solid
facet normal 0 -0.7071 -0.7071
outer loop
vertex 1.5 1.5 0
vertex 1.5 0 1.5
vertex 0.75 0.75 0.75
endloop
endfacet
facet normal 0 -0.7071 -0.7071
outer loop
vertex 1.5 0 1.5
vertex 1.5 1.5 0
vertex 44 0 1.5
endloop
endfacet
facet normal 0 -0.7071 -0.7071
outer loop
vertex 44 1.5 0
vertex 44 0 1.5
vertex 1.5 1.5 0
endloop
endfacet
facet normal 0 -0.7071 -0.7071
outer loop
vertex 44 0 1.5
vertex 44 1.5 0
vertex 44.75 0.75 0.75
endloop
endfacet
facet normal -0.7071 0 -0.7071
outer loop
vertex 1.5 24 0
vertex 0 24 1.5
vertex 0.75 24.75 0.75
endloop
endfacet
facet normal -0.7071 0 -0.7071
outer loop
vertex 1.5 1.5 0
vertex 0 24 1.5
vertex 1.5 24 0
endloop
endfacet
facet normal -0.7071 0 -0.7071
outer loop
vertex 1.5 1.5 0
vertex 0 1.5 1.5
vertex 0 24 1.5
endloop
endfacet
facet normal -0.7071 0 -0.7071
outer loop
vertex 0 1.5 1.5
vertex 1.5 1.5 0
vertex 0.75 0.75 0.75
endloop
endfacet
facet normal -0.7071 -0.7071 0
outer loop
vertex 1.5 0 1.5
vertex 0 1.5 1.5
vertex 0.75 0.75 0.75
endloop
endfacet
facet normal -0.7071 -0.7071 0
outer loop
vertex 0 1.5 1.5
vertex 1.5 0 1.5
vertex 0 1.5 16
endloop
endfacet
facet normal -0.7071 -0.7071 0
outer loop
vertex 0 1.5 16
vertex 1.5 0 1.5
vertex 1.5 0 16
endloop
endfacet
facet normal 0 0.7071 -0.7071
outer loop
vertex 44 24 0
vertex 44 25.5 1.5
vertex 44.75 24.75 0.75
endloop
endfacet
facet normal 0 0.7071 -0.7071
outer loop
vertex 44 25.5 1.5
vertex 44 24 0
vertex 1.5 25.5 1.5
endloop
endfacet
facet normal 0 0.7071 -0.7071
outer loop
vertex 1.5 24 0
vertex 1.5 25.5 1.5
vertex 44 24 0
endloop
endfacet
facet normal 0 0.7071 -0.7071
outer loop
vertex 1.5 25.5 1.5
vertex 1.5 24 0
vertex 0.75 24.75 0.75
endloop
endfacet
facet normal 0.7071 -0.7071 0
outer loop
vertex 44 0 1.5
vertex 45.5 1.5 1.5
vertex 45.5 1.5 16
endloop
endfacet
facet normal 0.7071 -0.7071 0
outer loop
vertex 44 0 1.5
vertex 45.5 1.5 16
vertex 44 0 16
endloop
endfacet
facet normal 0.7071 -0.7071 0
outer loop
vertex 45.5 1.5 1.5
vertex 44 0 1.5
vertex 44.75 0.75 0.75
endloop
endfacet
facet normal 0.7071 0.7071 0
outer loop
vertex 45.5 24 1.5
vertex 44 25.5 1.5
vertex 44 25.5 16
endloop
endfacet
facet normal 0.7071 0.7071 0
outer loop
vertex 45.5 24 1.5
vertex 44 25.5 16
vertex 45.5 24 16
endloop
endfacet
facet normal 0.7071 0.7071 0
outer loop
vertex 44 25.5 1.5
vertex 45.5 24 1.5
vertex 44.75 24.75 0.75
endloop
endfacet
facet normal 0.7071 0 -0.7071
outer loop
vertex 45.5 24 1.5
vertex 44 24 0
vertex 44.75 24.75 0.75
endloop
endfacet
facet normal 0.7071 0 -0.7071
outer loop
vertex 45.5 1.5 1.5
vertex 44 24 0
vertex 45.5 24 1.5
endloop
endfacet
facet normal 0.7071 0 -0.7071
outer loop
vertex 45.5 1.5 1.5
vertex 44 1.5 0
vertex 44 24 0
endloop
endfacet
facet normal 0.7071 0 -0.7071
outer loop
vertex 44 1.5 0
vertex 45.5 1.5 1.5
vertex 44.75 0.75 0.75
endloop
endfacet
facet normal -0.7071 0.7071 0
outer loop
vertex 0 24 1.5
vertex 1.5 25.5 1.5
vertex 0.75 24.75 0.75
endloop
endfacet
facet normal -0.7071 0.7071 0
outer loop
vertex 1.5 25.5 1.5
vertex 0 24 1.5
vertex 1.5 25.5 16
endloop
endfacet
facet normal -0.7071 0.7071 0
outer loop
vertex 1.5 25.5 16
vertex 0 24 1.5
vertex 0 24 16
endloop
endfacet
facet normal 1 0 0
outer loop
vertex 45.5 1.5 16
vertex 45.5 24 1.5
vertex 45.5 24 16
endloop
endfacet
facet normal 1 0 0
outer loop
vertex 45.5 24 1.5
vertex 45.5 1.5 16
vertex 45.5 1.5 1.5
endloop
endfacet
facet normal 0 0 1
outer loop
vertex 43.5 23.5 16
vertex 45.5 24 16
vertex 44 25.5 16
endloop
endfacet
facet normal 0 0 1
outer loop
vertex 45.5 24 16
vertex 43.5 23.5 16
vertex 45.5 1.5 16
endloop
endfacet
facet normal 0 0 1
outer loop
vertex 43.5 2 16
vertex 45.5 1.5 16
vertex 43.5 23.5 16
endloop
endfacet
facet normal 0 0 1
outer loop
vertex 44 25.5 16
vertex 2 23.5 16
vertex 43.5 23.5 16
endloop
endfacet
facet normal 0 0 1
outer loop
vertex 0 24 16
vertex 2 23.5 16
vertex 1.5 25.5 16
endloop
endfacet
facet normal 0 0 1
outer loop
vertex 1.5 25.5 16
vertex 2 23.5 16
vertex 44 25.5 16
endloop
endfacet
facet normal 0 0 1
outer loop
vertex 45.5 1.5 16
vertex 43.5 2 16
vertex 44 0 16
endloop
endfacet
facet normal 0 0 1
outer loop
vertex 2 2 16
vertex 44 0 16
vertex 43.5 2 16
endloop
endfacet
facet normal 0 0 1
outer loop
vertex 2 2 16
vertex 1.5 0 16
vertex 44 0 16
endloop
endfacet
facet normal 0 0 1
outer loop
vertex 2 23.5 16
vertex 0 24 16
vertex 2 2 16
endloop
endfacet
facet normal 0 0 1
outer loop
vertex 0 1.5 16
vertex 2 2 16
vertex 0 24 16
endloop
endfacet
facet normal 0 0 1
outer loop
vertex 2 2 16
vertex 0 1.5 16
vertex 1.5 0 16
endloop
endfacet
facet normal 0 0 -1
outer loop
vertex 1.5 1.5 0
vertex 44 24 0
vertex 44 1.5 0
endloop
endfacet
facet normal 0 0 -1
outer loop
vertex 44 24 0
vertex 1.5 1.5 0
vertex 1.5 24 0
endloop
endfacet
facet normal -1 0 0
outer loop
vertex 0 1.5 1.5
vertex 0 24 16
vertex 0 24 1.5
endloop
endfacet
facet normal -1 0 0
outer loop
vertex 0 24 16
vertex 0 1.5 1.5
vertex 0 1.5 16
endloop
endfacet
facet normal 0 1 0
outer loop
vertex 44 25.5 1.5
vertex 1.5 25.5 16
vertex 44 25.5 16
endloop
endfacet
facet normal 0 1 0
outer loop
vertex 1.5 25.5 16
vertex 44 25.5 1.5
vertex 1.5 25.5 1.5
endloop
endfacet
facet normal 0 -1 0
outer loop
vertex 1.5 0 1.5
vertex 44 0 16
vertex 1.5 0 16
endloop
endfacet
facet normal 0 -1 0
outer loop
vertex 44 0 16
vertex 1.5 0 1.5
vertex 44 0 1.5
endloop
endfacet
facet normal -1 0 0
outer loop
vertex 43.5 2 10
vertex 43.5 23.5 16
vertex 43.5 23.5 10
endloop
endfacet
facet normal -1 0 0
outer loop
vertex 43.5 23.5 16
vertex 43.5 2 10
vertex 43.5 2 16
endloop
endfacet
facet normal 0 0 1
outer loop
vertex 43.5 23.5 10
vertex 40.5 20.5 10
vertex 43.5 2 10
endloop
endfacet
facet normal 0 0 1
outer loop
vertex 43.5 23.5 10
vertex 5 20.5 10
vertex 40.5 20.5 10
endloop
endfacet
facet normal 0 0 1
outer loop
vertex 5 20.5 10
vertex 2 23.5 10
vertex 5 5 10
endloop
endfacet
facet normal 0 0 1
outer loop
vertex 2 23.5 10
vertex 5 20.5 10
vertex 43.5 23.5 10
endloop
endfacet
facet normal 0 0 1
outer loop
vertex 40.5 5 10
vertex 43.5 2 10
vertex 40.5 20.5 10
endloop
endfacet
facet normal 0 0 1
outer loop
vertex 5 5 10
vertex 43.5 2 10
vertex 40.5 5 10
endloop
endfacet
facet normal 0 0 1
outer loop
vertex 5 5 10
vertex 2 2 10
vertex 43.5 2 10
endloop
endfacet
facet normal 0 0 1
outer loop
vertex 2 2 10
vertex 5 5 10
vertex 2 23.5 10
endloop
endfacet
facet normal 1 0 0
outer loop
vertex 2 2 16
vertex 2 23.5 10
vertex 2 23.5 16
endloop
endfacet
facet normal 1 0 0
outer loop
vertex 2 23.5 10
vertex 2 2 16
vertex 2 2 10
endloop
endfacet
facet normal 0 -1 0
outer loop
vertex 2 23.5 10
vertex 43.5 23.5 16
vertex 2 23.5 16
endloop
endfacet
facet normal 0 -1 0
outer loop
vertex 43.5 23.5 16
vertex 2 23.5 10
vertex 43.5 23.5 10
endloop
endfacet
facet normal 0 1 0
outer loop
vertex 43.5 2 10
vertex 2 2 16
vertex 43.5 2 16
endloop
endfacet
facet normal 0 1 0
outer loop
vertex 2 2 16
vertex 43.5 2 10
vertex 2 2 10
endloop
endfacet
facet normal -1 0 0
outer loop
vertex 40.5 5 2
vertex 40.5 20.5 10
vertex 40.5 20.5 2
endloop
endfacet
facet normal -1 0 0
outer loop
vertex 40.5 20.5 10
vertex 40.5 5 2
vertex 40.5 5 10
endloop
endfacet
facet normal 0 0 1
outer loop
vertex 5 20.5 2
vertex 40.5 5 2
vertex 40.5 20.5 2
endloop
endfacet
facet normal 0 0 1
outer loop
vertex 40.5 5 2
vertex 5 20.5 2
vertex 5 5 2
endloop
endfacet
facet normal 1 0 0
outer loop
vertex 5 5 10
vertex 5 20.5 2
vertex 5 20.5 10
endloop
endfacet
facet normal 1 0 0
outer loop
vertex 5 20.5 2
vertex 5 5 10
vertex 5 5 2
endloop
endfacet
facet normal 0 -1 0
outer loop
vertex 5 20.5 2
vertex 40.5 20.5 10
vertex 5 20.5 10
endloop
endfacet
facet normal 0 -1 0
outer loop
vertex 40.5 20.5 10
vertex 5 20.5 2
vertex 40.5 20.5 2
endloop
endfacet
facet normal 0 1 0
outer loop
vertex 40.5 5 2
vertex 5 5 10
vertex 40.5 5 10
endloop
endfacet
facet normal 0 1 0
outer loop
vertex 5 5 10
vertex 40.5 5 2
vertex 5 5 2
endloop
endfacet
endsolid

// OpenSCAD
W = 41.5;
H = 21.5;
T = 2;
L = 10;
R = 6;
BT = 3;

difference() {
    chamferCube(W + T + T, H + T + T, L + R);
    translate([T, T, L]) cube([W, H, L + R]);
    translate([T + BT, T + BT, T]) cube([W - BT * 2, H - BT * 2, L + R]);
}


module chamferCube(sizeX, sizeY, sizeZ, chamferHeight = 1.5, chamferX = [2, 2, 0, 0], chamferY = [2, 0, 0, 2], chamferZ = [1, 1, 1, 1]) {
    chamferCLength = sqrt(chamferHeight * chamferHeight * 2);
    difference() {
        cube([sizeX, sizeY, sizeZ]);
        for(x = [0 : 3]) {
            chamferSide1 = min(x, 1) - floor(x / 3); // 0 1 1 0
            chamferSide2 = floor(x / 2); // 0 0 1 1
            if(chamferX[x]) {
                translate([-0.1, chamferSide1 * sizeY, -chamferHeight + chamferSide2 * sizeZ])
                rotate([45, 0, 0])
                cube([sizeX + 0.2, chamferCLength, chamferCLength]);
            }
            if(chamferY[x]) {
                translate([-chamferHeight + chamferSide2 * sizeX, -0.1, chamferSide1 * sizeZ])
                rotate([0, 45, 0])
                cube([chamferCLength, sizeY + 0.2, chamferCLength]);
            }
            if(chamferZ[x]) {
                translate([chamferSide1 * sizeX, -chamferHeight + chamferSide2 * sizeY, -0.1])
                rotate([0, 0, 45])
                cube([chamferCLength, chamferCLength, sizeZ + 0.2]);
            }
        }
    }
}
